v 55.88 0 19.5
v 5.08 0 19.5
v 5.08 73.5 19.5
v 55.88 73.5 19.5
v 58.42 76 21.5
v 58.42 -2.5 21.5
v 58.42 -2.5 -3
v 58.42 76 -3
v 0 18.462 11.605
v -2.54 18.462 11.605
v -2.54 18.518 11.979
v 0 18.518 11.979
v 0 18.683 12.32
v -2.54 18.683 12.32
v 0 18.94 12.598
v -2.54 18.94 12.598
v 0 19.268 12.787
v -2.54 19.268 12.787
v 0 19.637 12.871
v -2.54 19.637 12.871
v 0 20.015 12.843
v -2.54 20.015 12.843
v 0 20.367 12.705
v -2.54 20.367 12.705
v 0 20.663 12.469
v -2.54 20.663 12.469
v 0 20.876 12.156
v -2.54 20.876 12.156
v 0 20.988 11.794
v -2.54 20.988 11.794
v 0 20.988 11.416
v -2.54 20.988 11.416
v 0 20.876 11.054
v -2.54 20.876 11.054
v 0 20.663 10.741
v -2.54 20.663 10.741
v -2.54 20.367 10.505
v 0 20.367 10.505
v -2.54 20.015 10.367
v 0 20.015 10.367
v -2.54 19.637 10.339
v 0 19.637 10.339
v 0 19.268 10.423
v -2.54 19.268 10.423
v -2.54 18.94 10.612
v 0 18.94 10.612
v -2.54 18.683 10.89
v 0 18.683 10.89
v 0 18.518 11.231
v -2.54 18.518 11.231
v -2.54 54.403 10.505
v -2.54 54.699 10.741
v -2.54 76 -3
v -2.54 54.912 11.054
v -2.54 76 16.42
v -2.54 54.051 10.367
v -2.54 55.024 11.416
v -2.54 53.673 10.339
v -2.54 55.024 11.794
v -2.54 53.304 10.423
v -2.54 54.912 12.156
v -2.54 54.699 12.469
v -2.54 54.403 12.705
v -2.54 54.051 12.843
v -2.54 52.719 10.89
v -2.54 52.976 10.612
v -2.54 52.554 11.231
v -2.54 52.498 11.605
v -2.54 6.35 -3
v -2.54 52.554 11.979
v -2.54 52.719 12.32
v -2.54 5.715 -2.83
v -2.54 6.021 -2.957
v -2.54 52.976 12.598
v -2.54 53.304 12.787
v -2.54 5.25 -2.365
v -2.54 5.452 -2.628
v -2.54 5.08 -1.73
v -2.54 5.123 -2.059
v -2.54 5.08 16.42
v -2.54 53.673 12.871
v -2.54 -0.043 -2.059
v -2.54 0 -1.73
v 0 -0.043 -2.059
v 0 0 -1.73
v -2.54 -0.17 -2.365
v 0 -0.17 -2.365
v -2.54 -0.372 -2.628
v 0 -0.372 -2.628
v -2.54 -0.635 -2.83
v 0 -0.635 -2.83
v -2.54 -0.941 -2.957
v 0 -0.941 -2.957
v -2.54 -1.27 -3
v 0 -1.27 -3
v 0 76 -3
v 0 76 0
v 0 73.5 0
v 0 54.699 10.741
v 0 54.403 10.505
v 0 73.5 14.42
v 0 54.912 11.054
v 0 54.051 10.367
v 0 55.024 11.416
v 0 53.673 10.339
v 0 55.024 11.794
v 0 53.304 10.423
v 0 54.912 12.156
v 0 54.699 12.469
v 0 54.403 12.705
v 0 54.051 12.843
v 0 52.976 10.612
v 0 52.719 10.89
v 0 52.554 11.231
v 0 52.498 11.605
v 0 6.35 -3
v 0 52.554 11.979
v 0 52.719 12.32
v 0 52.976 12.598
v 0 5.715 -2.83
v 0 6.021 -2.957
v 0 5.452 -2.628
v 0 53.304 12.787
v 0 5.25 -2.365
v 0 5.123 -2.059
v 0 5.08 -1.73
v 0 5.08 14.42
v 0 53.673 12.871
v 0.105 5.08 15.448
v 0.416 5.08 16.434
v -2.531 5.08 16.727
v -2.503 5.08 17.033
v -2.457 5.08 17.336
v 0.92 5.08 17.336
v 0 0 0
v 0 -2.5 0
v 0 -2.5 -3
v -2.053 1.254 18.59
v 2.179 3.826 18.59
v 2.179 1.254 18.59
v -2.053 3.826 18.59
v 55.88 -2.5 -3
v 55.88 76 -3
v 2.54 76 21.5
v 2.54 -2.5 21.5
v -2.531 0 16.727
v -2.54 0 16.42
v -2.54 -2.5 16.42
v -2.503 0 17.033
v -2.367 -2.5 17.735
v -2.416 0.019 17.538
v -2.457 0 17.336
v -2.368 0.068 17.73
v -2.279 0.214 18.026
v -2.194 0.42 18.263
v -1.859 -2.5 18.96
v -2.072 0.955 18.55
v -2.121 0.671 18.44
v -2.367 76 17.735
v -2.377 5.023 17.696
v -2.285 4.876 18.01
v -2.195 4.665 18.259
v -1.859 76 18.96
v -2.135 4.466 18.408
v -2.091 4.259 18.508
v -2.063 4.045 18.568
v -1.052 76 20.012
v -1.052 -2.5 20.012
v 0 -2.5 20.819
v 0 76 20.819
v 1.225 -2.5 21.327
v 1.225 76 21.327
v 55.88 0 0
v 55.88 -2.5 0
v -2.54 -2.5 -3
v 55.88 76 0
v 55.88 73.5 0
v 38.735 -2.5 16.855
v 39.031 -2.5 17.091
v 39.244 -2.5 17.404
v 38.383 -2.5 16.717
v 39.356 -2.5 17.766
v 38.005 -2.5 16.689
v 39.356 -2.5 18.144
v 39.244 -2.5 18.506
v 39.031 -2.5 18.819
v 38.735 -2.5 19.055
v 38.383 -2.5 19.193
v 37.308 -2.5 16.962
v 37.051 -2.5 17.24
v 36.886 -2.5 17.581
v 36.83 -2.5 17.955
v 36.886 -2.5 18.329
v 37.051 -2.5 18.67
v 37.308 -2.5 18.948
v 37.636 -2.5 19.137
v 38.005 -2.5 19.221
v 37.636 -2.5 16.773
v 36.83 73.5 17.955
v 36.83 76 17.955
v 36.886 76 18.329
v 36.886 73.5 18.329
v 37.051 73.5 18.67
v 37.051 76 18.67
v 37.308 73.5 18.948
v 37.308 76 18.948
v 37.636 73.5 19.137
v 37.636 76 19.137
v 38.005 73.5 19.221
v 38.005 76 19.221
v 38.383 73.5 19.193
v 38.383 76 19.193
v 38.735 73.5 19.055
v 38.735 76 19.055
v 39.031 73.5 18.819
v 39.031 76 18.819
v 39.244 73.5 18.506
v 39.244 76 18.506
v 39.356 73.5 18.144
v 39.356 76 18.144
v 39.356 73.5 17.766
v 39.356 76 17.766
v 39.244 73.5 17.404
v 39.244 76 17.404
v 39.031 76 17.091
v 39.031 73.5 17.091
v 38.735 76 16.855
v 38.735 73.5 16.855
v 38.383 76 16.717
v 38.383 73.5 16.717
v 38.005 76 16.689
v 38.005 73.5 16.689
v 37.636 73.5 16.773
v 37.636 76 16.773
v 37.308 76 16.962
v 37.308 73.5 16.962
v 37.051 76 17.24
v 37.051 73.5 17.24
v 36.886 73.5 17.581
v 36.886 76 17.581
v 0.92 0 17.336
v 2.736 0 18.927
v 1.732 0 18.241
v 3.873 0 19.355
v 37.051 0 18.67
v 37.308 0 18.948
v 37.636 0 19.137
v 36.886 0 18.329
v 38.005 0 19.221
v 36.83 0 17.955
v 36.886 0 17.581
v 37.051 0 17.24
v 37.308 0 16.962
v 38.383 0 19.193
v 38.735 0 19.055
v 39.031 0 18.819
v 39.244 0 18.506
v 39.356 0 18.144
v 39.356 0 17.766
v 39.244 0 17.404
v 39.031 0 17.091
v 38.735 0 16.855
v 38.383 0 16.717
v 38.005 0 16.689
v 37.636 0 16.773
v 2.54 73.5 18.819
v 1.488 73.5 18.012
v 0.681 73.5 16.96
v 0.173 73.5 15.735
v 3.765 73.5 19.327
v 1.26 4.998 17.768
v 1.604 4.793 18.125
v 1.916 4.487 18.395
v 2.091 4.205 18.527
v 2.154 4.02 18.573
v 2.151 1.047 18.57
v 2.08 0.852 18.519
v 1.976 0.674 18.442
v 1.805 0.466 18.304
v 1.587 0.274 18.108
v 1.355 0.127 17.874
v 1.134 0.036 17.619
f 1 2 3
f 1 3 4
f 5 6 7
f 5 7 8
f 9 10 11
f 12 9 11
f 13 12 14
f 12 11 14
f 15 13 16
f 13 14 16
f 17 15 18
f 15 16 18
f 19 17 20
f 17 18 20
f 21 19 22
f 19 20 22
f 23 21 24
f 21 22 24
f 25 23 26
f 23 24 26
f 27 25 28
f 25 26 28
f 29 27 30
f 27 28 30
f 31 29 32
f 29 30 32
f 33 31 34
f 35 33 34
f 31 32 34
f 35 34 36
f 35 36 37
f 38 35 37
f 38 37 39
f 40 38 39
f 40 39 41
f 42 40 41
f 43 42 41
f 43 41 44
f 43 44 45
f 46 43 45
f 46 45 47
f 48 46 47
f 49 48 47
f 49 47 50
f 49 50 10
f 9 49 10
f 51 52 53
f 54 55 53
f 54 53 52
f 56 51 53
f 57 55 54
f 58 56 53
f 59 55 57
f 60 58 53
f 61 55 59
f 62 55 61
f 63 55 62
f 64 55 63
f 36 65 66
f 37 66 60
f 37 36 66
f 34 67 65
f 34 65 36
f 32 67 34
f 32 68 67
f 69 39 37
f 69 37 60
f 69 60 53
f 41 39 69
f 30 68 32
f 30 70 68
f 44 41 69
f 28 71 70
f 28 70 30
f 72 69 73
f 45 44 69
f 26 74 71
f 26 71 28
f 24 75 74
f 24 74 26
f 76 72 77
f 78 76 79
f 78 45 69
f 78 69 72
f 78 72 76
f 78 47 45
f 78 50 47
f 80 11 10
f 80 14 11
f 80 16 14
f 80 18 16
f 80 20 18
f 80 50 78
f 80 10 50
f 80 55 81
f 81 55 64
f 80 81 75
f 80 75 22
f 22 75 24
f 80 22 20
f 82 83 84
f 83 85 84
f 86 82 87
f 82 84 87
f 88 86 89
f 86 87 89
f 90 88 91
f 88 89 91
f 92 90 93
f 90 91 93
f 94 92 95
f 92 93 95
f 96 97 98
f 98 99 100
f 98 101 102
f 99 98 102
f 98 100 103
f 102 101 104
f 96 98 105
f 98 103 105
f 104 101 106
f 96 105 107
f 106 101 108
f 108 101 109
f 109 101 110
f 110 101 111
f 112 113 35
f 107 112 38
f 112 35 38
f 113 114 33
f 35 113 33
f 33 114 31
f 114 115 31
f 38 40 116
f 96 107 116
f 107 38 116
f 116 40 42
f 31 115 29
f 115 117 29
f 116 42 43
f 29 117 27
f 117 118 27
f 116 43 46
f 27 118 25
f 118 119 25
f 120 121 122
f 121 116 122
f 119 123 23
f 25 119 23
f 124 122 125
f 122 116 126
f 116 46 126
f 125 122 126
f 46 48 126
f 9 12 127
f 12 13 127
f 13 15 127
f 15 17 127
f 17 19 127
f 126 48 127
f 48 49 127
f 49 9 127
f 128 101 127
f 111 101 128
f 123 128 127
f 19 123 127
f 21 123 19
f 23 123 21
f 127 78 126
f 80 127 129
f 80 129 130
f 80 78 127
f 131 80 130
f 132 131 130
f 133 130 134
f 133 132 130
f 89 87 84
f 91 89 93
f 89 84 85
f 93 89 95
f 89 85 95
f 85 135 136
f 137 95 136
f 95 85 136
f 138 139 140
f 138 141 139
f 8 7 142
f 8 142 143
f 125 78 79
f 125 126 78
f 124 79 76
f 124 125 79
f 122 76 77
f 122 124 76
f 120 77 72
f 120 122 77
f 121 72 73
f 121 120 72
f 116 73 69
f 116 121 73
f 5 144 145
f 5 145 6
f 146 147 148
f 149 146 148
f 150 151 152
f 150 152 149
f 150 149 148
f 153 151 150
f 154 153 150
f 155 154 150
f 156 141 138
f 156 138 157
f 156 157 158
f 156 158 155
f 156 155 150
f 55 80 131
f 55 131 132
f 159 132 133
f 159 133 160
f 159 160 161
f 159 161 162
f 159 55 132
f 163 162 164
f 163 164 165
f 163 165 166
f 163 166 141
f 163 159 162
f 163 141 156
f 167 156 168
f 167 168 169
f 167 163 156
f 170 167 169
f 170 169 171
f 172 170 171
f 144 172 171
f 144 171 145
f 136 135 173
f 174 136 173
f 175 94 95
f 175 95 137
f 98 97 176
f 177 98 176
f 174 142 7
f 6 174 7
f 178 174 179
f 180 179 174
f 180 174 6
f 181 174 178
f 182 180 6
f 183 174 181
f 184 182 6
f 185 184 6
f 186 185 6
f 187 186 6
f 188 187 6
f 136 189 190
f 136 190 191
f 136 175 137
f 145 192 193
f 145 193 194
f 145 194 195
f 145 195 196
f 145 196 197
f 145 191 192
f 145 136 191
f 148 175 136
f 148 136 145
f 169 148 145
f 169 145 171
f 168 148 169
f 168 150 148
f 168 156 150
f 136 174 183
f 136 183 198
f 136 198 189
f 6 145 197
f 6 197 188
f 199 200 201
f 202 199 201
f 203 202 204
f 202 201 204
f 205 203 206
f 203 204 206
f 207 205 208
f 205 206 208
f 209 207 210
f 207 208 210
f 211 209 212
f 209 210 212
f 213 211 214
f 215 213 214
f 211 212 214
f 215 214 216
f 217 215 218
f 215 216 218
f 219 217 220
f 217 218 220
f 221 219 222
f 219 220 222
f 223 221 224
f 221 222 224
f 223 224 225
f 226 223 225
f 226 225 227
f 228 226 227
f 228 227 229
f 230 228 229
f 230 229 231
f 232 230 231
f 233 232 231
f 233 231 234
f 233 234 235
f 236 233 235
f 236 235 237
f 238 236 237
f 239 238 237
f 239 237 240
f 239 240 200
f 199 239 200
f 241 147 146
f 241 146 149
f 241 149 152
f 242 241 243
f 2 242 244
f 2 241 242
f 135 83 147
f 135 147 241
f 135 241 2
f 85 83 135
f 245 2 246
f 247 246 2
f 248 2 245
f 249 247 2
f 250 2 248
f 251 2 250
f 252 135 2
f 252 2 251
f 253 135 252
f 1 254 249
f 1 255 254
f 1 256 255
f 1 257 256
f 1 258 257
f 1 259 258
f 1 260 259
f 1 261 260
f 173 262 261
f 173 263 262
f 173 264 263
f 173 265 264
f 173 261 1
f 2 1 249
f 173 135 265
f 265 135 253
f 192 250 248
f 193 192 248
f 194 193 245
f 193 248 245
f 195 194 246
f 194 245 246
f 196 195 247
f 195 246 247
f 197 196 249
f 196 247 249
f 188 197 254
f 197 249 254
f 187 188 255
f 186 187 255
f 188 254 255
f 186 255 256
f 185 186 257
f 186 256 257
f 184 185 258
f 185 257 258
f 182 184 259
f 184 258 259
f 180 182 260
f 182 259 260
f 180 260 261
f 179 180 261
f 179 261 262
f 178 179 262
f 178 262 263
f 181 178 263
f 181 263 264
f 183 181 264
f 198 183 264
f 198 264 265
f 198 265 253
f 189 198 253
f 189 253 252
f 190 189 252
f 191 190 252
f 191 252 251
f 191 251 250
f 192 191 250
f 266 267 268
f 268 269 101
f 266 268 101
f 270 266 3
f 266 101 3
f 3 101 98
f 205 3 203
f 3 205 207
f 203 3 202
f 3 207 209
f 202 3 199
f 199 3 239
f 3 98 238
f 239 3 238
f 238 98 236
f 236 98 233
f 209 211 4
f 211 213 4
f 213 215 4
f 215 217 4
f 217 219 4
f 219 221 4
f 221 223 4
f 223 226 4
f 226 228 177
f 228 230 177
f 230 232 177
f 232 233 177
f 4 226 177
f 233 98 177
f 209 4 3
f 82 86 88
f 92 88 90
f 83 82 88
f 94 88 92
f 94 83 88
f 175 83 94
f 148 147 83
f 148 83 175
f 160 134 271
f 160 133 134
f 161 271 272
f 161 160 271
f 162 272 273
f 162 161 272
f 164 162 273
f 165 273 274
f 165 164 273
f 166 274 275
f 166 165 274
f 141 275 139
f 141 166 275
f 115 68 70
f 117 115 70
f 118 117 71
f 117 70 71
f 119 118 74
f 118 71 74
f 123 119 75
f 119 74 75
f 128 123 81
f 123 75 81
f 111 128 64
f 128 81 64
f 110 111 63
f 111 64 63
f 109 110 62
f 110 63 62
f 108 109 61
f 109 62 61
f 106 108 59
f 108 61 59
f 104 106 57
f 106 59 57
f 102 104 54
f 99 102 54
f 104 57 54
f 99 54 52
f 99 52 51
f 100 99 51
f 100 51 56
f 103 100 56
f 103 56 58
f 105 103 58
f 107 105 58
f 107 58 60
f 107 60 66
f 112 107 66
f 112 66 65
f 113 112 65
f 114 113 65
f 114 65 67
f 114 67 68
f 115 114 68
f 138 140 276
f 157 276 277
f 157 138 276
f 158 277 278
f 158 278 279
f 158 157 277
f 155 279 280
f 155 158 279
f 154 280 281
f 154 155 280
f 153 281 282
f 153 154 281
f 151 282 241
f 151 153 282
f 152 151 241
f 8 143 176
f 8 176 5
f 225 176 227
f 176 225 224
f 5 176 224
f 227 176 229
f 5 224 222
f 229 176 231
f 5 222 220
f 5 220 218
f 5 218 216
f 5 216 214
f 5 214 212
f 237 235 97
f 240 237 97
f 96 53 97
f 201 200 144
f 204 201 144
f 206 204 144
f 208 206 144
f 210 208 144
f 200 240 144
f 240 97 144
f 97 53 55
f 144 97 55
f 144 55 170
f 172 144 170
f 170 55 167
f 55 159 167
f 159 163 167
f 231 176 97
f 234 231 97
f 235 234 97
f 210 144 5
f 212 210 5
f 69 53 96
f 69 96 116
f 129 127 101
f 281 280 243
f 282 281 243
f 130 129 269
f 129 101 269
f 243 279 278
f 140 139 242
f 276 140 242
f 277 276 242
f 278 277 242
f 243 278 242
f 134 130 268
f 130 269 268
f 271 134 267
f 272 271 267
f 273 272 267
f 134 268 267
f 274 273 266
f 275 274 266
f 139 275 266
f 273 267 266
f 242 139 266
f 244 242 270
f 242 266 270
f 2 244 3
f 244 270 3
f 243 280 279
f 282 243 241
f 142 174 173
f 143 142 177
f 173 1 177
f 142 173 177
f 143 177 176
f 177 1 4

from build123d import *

# Parameters (mm, degrees)
F1_W         = 60.96
F1_H         = 78.5
F2_DEPTH     = 21.5
F0_W         = 55.88
F0_H         = 73.5
F3_DEPTH     = 19.5
F4_W         = 78.5
F4_H         = 3
F5_DEPTH     = 2.54
F6_W         = 78.5
F6_H         = 3
F7_DEPTH     = 2.54
F8_W         = 44.0962035209
F8_H         = 7.4383728206
F9_DEPTH     = 2.5
F10_W        = 5.08
F10_H        = 21.59
F11_DEPTH    = 25.4
F12_R        = 1.27
F13_R        = 1.27
F14_DEPTH    = 101.6
F15_R        = 1.27
F16_DEPTH    = 25.4
F17_T1_DEPTH = 2.54
F18_F1_R     = 5.08
F18_T2_DEPTH = 103.9


# Not quite as in the source:
# - a fillet or chamfer that OpenCascade refuses, or shapes differently, is made with other operations: its cross-section is extruded or revolved along the edge and cut away or added


with BuildPart() as f2:
    # F1 (on Top) → F2 (new body)
    with BuildSketch(Plane.XY):
        with Locations((27.94, 36.75)):
            Rectangle(F1_W, F1_H)
    extrude(amount=F2_DEPTH)

    # F0 (on Top) → F3 (cut)
    with BuildSketch(Plane.XY):
        with Locations((27.94, 36.75)):
            Rectangle(F0_W, F0_H)
    extrude(amount=F3_DEPTH, mode=Mode.SUBTRACT)

    # F4 (on face) → F5 (join, through all)
    with BuildSketch(Plane.YZ.offset(58.42)):
        with Locations((36.75, -1.5)):
            Rectangle(F4_W, F4_H)
    extrude(amount=-F5_DEPTH)

    # F6 (on face) → F7 (join, through all)
    with BuildSketch(Plane(origin=(-2.54, 0, 0), x_dir=(0, -1, 0), z_dir=(-1, 0, 0))):
        with Locations((-36.75, -1.5)):
            Rectangle(F6_W, F6_H)
    extrude(amount=-F7_DEPTH)

    # F8 (on face) → F9 (join, through all)
    with BuildSketch(Plane.XZ.offset(2.5)):
        with Locations((27.1060718223, 8.4709739313)):
            Rectangle(F8_W, F8_H)
    extrude(amount=-F9_DEPTH)

    # F10 (on face) → F11 (cut)
    with BuildSketch(Plane(origin=(-2.54, 0, 0), x_dir=(0, -1, 0), z_dir=(-1, 0, 0))):
        with Locations((-2.54, 7.795)):
            Rectangle(F10_W, F10_H)
    extrude(amount=-F11_DEPTH, mode=Mode.SUBTRACT)

    # F12
    f12_edges = [f2.edges().sort_by_distance(p)[0] for p in [
        (-1.27, 0, -3),
        (-1.27, 5.08, -3),
    ]]
    fillet(f12_edges, radius=F12_R)

    # F13 (on face) → F14 (cut)
    with BuildSketch(Plane(origin=(0, 76, 0), x_dir=(-1, 0, 0), z_dir=(0, 1, 0))):
        with Locations((-38.1, 17.955)):
            Circle(F13_R)
    extrude(amount=-F14_DEPTH, mode=Mode.SUBTRACT)

    # F15 (on face) → F16 (cut)
    with BuildSketch(Plane(origin=(-2.54, 0, 0), x_dir=(0, -1, 0), z_dir=(-1, 0, 0))):
        with Locations((-53.768, 11.605)):
            Circle(F15_R)
        with Locations((-19.732, 11.605)):
            Circle(F15_R)
    extrude(amount=-F16_DEPTH, mode=Mode.SUBTRACT)

    # F17: fillet of radius 1.27 on 2 edges, made by hand

    # F17_s2 → F17_t1 (join)
    with BuildSketch(Plane.YZ.offset(-2.54)):
        with BuildLine():
            ThreePointArc((1.2699, 18.5901), (0.3718743879, 18.2181256121), (-0.0001, 17.3201))
            Line((-0.0001, 17.3201), (-0.0255, 17.3201))
            ThreePointArc((-0.0255, 17.3201), (-0.0254, 17.95505), (-0.0254, 18.59))
            Line((-0.0254, 18.59), (0, 18.6154))
            ThreePointArc((0, 18.6154), (0.63495, 18.6154), (1.2699, 18.6155))
            Line((1.2699, 18.6155), (1.2699, 18.5901))
        make_face()
        with BuildLine():
            ThreePointArc((5.0801, 17.3201), (4.7081256121, 18.2181256121), (3.8101, 18.5901))
            Line((3.8101, 18.5901), (3.8101, 18.6155))
            ThreePointArc((3.8101, 18.6155), (4.44505, 18.6154), (5.08, 18.6154))
            Line((5.08, 18.6154), (5.1054, 18.59))
            ThreePointArc((5.1054, 18.59), (5.1054, 17.95505), (5.1055, 17.3201))
            Line((5.1055, 17.3201), (5.0801, 17.3201))
        make_face()
    extrude(amount=F17_T1_DEPTH)

    # F18: fillet of radius 5.08 on 2 edges, made by hand

    # F18_f1
    f18_f1_edges = [f2.edges().sort_by_distance(p)[0] for p in [
        (0, 36.75, 19.5),
    ]]
    fillet(f18_f1_edges, radius=F18_F1_R)

    # F18_s3 → F18_t2 (cut)
    with BuildSketch(Plane.XZ.offset(-88.7)):
        with BuildLine():
            ThreePointArc((-2.54, 16.42), (-1.0521024484, 20.0121024484), (2.54, 21.5))
            Line((2.54, 21.5), (2.54, 21.6016))
            Line((2.54, 21.6016), (-2.6416, 21.6016))
            Line((-2.6416, 21.6016), (-2.6416, 16.42))
            Line((-2.6416, 16.42), (-2.54, 16.42))
        make_face()
    extrude(amount=F18_T2_DEPTH, mode=Mode.SUBTRACT)


solid = f2.part
